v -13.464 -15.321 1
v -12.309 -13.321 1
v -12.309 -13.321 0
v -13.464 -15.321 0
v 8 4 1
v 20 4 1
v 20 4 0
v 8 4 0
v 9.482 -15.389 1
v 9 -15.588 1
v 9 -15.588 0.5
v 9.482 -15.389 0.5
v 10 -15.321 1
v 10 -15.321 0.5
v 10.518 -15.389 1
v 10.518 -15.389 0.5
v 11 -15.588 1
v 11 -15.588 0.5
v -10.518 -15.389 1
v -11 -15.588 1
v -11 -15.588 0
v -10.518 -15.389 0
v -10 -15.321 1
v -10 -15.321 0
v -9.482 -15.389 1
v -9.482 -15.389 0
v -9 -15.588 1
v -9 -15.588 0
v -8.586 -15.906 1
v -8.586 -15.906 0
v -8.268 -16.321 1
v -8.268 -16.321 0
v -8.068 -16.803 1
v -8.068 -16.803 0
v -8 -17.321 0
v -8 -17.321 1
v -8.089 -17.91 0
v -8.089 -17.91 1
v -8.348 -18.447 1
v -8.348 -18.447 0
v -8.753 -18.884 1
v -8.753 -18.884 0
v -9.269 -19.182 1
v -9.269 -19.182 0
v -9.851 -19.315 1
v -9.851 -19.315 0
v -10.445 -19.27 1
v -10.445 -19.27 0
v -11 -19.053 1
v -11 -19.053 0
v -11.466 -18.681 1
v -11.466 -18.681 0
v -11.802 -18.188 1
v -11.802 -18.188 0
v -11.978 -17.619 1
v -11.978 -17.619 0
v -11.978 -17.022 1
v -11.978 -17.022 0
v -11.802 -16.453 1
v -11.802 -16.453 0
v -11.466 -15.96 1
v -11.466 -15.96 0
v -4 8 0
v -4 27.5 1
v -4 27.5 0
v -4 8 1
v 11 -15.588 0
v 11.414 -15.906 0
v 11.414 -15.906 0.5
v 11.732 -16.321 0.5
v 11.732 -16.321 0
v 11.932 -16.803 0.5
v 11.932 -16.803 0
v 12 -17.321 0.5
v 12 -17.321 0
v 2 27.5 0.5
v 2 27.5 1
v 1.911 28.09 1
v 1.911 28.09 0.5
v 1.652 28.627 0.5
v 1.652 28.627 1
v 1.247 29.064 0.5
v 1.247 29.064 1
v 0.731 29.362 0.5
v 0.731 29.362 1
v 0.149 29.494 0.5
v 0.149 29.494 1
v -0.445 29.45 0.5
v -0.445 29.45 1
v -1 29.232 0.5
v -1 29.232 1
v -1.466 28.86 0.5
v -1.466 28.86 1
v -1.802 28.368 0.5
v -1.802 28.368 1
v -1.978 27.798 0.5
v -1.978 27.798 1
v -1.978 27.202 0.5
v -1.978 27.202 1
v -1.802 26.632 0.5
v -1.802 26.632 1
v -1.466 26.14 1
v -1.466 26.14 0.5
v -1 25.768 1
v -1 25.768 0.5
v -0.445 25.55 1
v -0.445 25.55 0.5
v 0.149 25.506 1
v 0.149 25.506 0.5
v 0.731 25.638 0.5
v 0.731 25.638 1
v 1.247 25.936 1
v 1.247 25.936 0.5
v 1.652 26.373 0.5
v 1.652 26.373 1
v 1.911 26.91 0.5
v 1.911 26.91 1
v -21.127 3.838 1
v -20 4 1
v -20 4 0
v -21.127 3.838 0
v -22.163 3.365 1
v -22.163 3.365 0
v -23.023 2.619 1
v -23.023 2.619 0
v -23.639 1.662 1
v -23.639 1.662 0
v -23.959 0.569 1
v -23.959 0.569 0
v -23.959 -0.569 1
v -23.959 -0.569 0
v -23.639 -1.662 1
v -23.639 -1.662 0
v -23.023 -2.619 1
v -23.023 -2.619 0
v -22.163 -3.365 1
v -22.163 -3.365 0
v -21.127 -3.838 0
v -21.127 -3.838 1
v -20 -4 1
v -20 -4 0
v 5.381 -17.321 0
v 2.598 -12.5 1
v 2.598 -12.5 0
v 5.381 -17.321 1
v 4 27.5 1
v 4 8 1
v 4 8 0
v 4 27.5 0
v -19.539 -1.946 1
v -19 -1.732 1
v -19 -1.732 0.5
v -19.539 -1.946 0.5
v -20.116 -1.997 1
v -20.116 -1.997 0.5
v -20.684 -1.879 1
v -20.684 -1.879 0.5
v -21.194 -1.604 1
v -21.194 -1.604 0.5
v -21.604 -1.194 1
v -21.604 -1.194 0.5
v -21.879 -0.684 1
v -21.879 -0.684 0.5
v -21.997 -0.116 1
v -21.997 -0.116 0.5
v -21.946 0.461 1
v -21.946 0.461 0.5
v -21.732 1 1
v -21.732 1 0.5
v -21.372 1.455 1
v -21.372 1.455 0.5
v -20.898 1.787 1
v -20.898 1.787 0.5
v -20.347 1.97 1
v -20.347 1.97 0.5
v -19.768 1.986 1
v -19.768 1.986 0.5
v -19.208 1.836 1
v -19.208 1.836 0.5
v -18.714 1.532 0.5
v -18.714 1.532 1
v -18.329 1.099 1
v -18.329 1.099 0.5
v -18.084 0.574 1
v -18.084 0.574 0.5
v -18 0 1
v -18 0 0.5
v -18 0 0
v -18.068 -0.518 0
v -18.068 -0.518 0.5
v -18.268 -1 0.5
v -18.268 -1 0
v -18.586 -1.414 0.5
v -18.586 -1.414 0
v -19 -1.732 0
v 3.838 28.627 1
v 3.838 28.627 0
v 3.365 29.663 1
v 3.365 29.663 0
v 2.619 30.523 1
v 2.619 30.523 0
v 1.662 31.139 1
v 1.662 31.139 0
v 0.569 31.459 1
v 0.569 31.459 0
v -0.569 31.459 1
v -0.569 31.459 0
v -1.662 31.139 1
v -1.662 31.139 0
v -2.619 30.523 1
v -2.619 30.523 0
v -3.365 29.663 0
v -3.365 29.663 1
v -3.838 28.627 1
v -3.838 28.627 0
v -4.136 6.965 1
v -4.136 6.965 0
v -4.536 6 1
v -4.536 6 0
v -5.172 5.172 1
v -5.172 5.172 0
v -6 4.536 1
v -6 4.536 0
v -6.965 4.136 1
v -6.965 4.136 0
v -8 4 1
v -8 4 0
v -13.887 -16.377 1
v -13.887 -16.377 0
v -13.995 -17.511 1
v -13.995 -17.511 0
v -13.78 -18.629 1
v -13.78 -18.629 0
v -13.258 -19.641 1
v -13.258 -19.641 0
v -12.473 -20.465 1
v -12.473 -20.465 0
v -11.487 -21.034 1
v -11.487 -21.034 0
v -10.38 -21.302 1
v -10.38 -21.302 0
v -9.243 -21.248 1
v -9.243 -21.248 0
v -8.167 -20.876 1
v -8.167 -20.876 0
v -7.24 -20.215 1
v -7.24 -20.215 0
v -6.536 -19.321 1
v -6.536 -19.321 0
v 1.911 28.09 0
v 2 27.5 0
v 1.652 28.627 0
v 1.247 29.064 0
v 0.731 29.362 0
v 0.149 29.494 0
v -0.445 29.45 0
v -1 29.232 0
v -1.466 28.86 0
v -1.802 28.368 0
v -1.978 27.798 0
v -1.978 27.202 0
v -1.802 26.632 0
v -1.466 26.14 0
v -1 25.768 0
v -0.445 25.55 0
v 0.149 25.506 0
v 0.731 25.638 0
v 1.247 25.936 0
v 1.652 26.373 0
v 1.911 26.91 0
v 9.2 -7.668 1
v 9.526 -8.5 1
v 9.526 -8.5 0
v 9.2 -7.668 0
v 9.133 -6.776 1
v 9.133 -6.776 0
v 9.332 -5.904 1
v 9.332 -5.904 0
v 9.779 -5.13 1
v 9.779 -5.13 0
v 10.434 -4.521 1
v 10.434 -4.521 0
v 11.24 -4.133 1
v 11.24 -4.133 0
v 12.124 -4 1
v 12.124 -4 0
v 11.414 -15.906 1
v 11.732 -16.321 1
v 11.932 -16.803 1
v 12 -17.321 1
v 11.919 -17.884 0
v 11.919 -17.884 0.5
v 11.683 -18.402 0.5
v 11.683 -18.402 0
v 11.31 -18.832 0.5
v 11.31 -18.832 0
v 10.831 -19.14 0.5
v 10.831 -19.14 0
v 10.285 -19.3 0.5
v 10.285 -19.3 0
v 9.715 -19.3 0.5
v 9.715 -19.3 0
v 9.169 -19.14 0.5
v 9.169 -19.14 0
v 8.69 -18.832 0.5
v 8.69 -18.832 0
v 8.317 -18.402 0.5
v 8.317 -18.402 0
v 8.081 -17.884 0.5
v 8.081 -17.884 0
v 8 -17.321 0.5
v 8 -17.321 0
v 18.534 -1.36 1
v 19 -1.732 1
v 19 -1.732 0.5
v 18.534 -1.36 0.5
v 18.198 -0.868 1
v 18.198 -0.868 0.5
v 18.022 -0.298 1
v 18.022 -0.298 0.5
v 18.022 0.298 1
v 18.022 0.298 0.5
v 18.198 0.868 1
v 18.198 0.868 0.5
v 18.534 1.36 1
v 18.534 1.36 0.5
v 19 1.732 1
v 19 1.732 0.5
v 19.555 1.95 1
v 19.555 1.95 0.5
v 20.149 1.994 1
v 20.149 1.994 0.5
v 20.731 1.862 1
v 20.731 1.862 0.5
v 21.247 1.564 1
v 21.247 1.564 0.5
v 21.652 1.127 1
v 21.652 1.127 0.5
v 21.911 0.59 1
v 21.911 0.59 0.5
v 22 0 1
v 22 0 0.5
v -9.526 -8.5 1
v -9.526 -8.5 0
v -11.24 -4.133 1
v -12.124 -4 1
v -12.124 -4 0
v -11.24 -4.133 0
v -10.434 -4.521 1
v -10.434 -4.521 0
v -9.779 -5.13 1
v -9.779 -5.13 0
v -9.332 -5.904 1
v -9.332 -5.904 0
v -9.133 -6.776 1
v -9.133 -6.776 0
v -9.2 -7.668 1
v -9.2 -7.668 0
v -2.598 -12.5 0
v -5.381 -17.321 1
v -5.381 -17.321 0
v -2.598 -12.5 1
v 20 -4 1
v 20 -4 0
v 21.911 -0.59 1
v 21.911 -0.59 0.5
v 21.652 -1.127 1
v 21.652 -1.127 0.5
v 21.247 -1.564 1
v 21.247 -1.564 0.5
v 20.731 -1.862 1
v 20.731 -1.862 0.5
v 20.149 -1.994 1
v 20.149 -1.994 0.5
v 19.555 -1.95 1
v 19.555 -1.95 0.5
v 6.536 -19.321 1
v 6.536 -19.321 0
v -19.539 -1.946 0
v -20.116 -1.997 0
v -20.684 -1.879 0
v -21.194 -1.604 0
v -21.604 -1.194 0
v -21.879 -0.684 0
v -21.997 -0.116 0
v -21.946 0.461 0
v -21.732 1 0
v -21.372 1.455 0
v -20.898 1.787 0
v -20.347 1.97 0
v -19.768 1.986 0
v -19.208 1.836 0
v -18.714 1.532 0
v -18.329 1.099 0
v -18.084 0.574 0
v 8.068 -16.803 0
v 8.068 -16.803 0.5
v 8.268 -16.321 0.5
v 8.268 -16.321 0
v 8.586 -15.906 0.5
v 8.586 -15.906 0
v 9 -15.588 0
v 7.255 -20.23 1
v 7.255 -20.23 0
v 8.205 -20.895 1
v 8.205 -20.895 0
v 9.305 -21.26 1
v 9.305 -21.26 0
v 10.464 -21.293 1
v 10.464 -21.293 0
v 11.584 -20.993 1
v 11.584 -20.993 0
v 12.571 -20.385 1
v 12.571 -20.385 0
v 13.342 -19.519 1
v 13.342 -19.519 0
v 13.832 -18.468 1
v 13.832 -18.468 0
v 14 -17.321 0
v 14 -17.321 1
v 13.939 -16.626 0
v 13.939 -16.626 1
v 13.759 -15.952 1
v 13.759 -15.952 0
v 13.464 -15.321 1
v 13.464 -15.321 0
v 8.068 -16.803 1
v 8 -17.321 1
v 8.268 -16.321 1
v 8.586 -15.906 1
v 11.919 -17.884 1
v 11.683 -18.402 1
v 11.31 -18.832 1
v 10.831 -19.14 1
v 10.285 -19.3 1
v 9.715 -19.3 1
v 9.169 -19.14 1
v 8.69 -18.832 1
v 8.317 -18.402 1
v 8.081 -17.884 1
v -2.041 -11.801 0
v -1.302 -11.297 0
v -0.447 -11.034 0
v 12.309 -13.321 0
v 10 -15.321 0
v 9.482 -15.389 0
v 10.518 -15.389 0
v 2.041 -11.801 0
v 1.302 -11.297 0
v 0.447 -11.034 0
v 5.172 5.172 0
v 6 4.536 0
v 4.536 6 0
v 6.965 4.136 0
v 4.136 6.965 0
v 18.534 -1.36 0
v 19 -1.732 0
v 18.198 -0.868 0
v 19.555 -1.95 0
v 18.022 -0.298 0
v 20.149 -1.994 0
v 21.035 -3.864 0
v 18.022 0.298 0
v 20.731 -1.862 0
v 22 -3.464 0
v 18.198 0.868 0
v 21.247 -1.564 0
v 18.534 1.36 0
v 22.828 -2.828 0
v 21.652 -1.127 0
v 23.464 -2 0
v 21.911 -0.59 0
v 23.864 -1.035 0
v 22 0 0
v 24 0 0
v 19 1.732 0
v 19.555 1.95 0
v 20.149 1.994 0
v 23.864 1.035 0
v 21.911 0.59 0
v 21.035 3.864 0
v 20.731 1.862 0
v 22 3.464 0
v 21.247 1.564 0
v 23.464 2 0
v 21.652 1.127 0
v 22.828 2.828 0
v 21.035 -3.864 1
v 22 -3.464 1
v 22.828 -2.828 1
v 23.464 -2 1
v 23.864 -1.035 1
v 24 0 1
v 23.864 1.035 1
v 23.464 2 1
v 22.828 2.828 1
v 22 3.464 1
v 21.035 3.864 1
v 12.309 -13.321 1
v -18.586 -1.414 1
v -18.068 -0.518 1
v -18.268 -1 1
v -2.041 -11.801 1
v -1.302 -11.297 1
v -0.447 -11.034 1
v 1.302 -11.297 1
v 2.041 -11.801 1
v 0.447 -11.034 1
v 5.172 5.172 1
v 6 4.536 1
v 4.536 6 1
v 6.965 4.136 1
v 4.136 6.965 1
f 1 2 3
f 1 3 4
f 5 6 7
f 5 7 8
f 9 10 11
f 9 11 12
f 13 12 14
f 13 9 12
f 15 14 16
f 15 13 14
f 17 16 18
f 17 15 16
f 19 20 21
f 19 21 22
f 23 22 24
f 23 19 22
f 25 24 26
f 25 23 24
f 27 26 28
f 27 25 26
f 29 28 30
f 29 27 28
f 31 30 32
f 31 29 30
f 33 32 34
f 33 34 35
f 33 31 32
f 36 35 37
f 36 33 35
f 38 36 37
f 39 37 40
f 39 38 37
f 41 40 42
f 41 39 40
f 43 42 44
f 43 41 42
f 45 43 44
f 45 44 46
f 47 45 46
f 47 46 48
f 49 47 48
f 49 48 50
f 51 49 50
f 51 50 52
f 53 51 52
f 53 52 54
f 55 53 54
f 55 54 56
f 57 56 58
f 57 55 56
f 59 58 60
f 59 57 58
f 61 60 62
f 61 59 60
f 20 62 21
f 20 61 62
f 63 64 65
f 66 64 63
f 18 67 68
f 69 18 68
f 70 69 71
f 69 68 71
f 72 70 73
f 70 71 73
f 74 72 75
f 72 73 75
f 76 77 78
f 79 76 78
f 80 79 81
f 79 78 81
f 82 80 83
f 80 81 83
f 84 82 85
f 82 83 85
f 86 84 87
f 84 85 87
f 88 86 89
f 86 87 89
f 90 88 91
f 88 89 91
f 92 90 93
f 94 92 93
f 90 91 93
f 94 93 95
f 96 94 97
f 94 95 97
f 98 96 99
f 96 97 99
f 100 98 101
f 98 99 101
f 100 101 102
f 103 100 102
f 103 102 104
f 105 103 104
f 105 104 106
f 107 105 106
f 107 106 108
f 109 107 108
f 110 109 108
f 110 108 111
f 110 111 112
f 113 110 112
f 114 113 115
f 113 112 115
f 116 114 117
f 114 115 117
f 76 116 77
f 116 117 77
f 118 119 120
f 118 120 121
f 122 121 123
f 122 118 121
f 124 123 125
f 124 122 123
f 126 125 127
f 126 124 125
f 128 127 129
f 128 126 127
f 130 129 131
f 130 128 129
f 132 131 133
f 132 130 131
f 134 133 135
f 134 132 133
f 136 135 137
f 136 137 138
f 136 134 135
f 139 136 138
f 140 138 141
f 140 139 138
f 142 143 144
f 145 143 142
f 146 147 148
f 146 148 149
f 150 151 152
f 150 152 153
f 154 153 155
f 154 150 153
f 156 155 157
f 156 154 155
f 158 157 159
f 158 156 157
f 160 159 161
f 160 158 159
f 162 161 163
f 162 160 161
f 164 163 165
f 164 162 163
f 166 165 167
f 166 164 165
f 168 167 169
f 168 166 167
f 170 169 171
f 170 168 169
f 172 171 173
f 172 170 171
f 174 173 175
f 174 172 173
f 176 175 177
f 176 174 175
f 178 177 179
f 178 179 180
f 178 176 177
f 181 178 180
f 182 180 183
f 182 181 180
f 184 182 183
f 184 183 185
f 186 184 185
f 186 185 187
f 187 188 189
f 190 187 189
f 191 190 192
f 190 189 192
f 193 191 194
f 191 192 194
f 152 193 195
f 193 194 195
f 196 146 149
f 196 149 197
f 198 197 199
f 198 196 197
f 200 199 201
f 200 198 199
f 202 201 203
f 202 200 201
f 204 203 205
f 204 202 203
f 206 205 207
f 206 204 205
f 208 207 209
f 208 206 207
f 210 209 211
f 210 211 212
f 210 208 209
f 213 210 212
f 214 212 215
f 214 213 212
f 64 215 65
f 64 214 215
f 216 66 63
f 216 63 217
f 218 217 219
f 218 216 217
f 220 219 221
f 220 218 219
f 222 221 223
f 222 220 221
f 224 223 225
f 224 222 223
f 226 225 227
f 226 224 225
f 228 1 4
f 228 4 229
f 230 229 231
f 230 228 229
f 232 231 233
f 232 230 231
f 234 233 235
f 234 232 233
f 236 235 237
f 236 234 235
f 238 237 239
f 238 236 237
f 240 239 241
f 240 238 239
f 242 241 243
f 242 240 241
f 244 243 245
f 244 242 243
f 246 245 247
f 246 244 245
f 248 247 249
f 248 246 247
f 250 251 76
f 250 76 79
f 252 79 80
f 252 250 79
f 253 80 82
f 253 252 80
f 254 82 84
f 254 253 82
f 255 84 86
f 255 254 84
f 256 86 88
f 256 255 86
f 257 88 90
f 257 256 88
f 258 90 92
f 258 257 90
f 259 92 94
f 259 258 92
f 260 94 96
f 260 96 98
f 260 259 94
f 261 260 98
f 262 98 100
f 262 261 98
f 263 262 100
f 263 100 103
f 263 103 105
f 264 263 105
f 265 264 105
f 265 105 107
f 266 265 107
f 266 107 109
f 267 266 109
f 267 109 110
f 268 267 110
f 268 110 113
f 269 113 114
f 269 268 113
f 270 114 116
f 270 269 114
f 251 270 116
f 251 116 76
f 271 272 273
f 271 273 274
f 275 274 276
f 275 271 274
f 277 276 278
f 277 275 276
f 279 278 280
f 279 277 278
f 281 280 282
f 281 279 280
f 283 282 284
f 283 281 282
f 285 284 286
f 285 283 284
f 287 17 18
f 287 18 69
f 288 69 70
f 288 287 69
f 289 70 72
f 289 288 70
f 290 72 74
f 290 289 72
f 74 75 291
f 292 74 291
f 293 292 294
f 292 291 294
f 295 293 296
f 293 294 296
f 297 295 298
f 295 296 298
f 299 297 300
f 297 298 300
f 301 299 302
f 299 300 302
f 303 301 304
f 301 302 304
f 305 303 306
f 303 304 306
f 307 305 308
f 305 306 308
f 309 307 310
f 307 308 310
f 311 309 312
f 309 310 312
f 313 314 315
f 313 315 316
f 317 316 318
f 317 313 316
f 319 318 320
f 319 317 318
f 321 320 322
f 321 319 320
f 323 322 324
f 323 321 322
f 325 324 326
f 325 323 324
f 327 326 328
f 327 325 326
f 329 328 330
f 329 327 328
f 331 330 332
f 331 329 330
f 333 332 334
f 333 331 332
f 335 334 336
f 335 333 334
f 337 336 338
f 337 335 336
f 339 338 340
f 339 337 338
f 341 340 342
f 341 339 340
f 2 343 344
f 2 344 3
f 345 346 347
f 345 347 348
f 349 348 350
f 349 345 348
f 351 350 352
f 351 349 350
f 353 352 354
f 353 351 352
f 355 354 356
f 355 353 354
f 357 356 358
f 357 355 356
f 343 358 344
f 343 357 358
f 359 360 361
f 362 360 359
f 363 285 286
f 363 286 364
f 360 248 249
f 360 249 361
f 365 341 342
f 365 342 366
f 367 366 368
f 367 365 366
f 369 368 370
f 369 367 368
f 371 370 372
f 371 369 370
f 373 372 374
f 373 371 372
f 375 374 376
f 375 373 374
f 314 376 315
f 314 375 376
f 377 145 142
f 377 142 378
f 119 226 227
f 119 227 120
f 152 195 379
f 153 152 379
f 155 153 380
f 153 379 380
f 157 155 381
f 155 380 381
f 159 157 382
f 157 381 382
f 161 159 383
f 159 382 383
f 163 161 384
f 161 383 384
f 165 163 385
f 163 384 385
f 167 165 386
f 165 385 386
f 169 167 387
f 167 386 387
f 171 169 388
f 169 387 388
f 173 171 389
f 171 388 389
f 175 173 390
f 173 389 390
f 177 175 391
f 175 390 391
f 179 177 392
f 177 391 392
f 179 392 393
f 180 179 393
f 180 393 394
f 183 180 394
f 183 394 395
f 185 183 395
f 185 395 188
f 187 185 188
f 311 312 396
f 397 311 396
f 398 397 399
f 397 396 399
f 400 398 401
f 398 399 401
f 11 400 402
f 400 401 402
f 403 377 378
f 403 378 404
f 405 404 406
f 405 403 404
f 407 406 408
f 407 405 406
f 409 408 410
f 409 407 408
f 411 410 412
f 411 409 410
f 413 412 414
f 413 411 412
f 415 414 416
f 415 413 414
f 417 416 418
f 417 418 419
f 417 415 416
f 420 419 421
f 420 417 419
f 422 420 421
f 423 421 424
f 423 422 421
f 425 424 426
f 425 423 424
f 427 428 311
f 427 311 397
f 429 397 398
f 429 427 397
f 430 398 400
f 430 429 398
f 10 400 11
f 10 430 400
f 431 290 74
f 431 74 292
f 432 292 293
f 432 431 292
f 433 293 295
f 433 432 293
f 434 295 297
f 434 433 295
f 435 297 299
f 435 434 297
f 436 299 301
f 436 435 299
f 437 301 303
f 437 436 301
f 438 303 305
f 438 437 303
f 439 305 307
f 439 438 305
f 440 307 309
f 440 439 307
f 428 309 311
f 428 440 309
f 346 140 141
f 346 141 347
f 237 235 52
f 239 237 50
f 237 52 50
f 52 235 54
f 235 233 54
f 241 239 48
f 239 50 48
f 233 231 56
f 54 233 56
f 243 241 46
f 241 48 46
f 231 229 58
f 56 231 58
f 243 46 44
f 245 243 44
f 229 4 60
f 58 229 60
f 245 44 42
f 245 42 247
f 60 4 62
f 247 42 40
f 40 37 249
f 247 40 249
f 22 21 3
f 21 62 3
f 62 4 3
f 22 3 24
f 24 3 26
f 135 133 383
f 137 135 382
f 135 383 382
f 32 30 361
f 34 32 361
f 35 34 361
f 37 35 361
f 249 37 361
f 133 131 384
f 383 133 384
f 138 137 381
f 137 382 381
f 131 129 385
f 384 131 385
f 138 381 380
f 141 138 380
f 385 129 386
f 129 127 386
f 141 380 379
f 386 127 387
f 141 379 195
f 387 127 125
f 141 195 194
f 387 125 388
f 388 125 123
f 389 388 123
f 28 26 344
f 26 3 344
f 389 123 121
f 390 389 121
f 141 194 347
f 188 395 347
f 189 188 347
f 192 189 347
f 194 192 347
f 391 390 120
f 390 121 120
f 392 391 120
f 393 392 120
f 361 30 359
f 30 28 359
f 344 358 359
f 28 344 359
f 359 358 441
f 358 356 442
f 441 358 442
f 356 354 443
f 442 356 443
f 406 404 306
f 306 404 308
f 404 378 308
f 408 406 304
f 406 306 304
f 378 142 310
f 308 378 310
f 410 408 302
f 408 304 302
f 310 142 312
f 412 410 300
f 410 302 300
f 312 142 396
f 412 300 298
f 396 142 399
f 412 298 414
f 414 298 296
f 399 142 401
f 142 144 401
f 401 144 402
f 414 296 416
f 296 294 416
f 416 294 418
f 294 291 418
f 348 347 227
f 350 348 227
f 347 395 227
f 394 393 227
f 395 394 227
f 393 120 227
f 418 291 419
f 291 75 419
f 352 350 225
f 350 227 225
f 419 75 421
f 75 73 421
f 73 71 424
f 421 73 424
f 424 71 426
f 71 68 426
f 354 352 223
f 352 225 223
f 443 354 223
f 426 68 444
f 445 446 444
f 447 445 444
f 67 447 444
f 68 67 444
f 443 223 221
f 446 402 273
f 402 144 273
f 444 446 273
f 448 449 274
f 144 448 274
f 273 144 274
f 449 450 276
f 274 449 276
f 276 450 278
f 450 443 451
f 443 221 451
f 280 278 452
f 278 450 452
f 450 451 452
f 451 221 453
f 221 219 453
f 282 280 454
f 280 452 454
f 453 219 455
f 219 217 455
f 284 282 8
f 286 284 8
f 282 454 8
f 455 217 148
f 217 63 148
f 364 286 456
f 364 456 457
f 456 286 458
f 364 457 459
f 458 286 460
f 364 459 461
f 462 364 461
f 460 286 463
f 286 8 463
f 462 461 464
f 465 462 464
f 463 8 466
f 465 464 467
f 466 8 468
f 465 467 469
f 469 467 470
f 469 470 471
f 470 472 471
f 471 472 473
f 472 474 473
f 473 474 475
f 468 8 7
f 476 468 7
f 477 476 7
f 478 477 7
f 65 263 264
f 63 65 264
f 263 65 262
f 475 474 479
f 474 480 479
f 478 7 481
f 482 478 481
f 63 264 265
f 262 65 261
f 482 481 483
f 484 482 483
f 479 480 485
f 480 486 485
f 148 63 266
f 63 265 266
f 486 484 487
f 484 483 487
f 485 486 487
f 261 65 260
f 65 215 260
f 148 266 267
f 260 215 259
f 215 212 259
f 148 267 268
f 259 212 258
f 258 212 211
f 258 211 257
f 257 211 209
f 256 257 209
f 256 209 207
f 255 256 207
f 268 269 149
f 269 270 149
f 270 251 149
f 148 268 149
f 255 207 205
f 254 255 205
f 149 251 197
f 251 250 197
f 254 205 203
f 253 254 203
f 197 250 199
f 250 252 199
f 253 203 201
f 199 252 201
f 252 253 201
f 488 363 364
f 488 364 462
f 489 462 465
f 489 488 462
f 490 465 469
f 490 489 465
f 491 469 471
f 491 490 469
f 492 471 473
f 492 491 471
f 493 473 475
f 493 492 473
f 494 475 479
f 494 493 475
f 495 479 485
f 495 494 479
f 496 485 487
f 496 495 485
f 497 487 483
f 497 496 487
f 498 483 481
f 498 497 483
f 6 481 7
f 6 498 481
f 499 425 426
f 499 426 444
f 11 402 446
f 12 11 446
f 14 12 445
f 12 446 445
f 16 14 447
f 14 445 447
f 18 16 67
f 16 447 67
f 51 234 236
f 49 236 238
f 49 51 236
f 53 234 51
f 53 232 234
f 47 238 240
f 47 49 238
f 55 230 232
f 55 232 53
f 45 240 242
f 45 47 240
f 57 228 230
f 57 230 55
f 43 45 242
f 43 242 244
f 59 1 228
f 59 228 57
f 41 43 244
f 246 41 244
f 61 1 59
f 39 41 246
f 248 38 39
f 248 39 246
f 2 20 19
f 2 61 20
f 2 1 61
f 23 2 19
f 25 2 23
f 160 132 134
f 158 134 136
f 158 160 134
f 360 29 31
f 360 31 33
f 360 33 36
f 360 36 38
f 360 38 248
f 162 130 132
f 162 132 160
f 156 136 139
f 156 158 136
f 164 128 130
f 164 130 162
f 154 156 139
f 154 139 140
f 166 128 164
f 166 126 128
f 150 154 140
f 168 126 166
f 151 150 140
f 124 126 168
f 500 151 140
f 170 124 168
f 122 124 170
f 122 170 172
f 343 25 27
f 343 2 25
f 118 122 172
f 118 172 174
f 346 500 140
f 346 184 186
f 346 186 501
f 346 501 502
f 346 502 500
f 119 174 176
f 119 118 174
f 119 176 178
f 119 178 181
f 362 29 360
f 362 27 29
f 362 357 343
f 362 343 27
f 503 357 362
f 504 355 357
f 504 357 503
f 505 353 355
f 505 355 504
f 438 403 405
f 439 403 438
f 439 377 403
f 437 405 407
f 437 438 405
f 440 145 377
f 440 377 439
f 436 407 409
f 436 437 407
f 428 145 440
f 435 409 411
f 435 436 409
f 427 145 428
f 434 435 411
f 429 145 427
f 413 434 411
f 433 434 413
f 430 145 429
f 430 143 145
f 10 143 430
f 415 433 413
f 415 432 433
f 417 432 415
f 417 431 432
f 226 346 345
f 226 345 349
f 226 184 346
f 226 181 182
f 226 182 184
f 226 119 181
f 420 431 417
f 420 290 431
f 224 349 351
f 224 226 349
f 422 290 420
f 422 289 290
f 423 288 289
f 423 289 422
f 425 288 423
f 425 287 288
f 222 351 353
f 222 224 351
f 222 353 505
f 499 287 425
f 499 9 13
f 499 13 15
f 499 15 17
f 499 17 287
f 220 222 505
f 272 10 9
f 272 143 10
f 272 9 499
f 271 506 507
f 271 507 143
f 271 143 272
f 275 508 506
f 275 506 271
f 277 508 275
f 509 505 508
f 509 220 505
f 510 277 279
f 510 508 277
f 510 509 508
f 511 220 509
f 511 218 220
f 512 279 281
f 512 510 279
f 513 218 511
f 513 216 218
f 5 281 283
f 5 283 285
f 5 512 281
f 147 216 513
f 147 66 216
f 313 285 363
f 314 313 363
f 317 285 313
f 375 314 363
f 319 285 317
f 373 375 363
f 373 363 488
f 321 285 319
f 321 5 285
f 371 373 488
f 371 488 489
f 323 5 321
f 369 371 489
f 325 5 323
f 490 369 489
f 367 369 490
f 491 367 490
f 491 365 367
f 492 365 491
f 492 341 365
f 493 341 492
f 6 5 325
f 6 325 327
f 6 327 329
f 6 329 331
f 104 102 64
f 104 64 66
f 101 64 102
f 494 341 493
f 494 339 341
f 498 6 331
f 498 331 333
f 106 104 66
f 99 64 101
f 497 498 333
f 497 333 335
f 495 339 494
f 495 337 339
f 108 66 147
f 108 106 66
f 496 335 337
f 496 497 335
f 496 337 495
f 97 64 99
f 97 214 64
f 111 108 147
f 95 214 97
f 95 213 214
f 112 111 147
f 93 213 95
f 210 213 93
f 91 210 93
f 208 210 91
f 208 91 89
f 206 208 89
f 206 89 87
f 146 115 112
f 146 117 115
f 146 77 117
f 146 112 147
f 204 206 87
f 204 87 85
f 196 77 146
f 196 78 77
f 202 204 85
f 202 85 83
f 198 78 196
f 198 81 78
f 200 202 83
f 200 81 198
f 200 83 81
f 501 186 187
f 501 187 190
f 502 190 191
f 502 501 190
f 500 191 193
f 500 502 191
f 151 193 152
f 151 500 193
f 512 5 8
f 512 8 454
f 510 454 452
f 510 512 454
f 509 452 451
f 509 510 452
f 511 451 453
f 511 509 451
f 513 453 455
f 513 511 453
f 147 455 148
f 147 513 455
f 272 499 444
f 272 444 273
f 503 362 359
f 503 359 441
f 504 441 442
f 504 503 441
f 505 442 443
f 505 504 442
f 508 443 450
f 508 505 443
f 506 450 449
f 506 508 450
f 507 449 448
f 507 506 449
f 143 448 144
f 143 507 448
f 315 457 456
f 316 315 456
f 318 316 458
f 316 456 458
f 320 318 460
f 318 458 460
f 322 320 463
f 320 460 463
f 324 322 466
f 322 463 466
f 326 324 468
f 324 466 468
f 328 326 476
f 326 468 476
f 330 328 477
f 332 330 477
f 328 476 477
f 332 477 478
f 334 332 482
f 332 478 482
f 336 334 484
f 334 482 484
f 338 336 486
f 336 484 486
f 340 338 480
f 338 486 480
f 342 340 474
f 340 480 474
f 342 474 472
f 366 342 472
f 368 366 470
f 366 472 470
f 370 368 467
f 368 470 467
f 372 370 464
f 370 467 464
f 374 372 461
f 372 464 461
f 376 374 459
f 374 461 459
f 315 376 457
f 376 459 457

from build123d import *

# Parameters (mm, degrees)
F0_R     = 2
F1_DEPTH = 0.5


# Not quite as in the source:
# - a pattern or mirror of a feature is missing from the dataset's text; its kind, count and spacing are read off the source's solid


with BuildPart() as f1:
    # F0 (on Top) → F1 (new body)
    with BuildSketch(Plane.XY):
        with BuildLine():
            ThreePointArc((-20, 4), (-17.1715728753, 2.8284271247), (-16, 0))
            Line((-16, 0), (0, 0))
            Line((0, 0), (8, -13.8564064606))
            ThreePointArc((8, -13.8564064606), (10, -13.3205080757), (12, -13.8564064606))
            Line((12, -13.8564064606), (12.3094010768, -13.3205080757))
            Line((12.3094010768, -13.3205080757), (9.5262794416, -8.5))
            ThreePointArc((9.5262794416, -8.5), (9.5262794416, -5.5), (12.124355653, -4))
            Line((12.124355653, -4), (17.6905989232, -4))
            Line((17.6905989232, -4), (18, -3.4641016151))
            ThreePointArc((18, -3.4641016151), (16.1362966948, 1.0352761804), (20, 4))
            Line((20, 4), (8, 4))
            ThreePointArc((8, 4), (5.1715728753, 5.1715728753), (4, 8))
            Line((4, 8), (4, 27.5))
            ThreePointArc((4, 27.5), (0, 23.5), (-4, 27.5))
            Line((-4, 27.5), (-4, 8))
            ThreePointArc((-4, 8), (-5.1715728753, 5.1715728753), (-8, 4))
            Line((-8, 4), (-20, 4))
        make_face()
        with BuildLine():
            Line((0, 0), (-16, 0))
            ThreePointArc((-16, 0), (-16.5358983849, -2), (-18, -3.4641016151))
            Line((-18, -3.4641016151), (-17.6905989232, -4))
            Line((-17.6905989232, -4), (-12.124355653, -4))
            ThreePointArc((-12.124355653, -4), (-9.5262794416, -5.5), (-9.5262794416, -8.5))
            Line((-9.5262794416, -8.5), (-12.3094010768, -13.3205080757))
            Line((-12.3094010768, -13.3205080757), (-12, -13.8564064606))
            ThreePointArc((-12, -13.8564064606), (-10, -13.3205080757), (-8, -13.8564064606))
            Line((-8, -13.8564064606), (0, 0))
        make_face()
        with BuildLine():
            Line((8, -13.8564064606), (0, 0))
            Line((0, 0), (-8, -13.8564064606))
            ThreePointArc((-8, -13.8564064606), (-6.5358983849, -15.3205080757), (-6, -17.3205080757))
            Line((-6, -17.3205080757), (-5.3811978465, -17.3205080757))
            Line((-5.3811978465, -17.3205080757), (-2.5980762114, -12.5))
            ThreePointArc((-2.5980762114, -12.5), (0, -11), (2.5980762114, -12.5))
            Line((2.5980762114, -12.5), (5.3811978465, -17.3205080757))
            Line((5.3811978465, -17.3205080757), (6, -17.3205080757))
            ThreePointArc((6, -17.3205080757), (6.5358983849, -15.3205080757), (8, -13.8564064606))
        make_face()
        with BuildLine():
            Line((-9, -15.5884572681), (-8, -13.8564064606))
            ThreePointArc((-8, -13.8564064606), (-10, -13.3205080757), (-12, -13.8564064606))
            Line((-12, -13.8564064606), (-11, -15.5884572681))
            ThreePointArc((-11, -15.5884572681), (-10, -15.3205080757), (-9, -15.5884572681))
        make_face()
        with BuildLine():
            ThreePointArc((-6.5358983849, -19.3205080757), (-6.1362966948, -18.3557842561), (-6, -17.3205080757))
            Line((-6, -17.3205080757), (-8, -17.3205080757))
            ThreePointArc((-8, -17.3205080757), (-11, -19.0525588833), (-11, -15.5884572681))
            Line((-11, -15.5884572681), (-12, -13.8564064606))
            ThreePointArc((-12, -13.8564064606), (-12.8284271247, -14.4920809509), (-13.4641016151, -15.3205080757))
            ThreePointArc((-13.4641016151, -15.3205080757), (-12, -20.7846096908), (-6.5358983849, -19.3205080757))
        make_face()
        with BuildLine():
            ThreePointArc((-6, -17.3205080757), (-6.5358983849, -15.3205080757), (-8, -13.8564064606))
            Line((-8, -13.8564064606), (-9, -15.5884572681))
            ThreePointArc((-9, -15.5884572681), (-8.2679491924, -16.3205080757), (-8, -17.3205080757))
            Line((-8, -17.3205080757), (-6, -17.3205080757))
        make_face()
        with BuildLine():
            ThreePointArc((13.4641016151, -15.3205080757), (12.8284271247, -14.4920809509), (12, -13.8564064606))
            Line((12, -13.8564064606), (11, -15.5884572681))
            ThreePointArc((11, -15.5884572681), (11.7320508076, -16.3205080757), (12, -17.3205080757))
            ThreePointArc((12, -17.3205080757), (10, -19.3205080757), (8, -17.3205080757))
            Line((8, -17.3205080757), (6, -17.3205080757))
            ThreePointArc((6, -17.3205080757), (6.1362966948, -18.3557842561), (6.5358983849, -19.3205080757))
            ThreePointArc((6.5358983849, -19.3205080757), (11.0352761804, -21.1842113808), (14, -17.3205080757))
            ThreePointArc((14, -17.3205080757), (13.8637033052, -16.2852318953), (13.4641016151, -15.3205080757))
        make_face()
        with BuildLine():
            Line((9, -15.5884572681), (8, -13.8564064606))
            ThreePointArc((8, -13.8564064606), (6.5358983849, -15.3205080757), (6, -17.3205080757))
            Line((6, -17.3205080757), (8, -17.3205080757))
            ThreePointArc((8, -17.3205080757), (8.2679491924, -16.3205080757), (9, -15.5884572681))
        make_face()
        with BuildLine():
            ThreePointArc((12, -13.8564064606), (10, -13.3205080757), (8, -13.8564064606))
            Line((8, -13.8564064606), (9, -15.5884572681))
            ThreePointArc((9, -15.5884572681), (10, -15.3205080757), (11, -15.5884572681))
            Line((11, -15.5884572681), (12, -13.8564064606))
        make_face()
        with BuildLine():
            ThreePointArc((-19, -1.7320508076), (-21.7320508076, 1), (-18, 0))
            Line((-18, 0), (-16, 0))
            ThreePointArc((-16, 0), (-17.1715728753, 2.8284271247), (-20, 4))
            ThreePointArc((-20, 4), (-24, 0), (-20, -4))
            ThreePointArc((-20, -4), (-18.9647238196, -3.8637033052), (-18, -3.4641016151))
            Line((-18, -3.4641016151), (-19, -1.7320508076))
        make_face()
        with BuildLine():
            Line((-16, 0), (-18, 0))
            ThreePointArc((-18, 0), (-18.2679491924, -1), (-19, -1.7320508076))
            Line((-19, -1.7320508076), (-18, -3.4641016151))
            ThreePointArc((-18, -3.4641016151), (-16.5358983849, -2), (-16, 0))
        make_face()
        with BuildLine():
            ThreePointArc((20, 4), (16.1362966948, 1.0352761804), (18, -3.4641016151))
            ThreePointArc((18, -3.4641016151), (18.9647238196, -3.8637033052), (20, -4))
            ThreePointArc((20, -4), (22.8284271247, -2.8284271247), (24, 0))
            ThreePointArc((24, 0), (22.8284271247, 2.8284271247), (20, 4))
        make_face()
        with BuildLine():
            ThreePointArc((22, 0), (21, -1.7320508076), (19, -1.7320508076))
            ThreePointArc((19, -1.7320508076), (19, 1.7320508076), (22, 0))
        make_face(mode=Mode.SUBTRACT)
        with BuildLine():
            ThreePointArc((4, 27.5), (0, 31.5), (-4, 27.5))
            ThreePointArc((-4, 27.5), (0, 23.5), (4, 27.5))
        make_face()
        with Locations((0, 27.5)):
            Circle(F0_R, mode=Mode.SUBTRACT)
        with BuildLine():
            Line((-17.6905989232, -4), (-18, -3.4641016151))
            ThreePointArc((-18, -3.4641016151), (-18.9647238196, -3.8637033052), (-20, -4))
            Line((-20, -4), (-17.6905989232, -4))
        make_face()
        with BuildLine():
            Line((-12, -13.8564064606), (-12.3094010768, -13.3205080757))
            Line((-12.3094010768, -13.3205080757), (-13.4641016151, -15.3205080757))
            ThreePointArc((-13.4641016151, -15.3205080757), (-12.8284271247, -14.4920809509), (-12, -13.8564064606))
        make_face()
        with BuildLine():
            Line((-5.3811978465, -17.3205080757), (-6, -17.3205080757))
            ThreePointArc((-6, -17.3205080757), (-6.1362966948, -18.3557842561), (-6.5358983849, -19.3205080757))
            Line((-6.5358983849, -19.3205080757), (-5.3811978465, -17.3205080757))
        make_face()
        with BuildLine():
            ThreePointArc((6.5358983849, -19.3205080757), (6.1362966948, -18.3557842561), (6, -17.3205080757))
            Line((6, -17.3205080757), (5.3811978465, -17.3205080757))
            Line((5.3811978465, -17.3205080757), (6.5358983849, -19.3205080757))
        make_face()
        with BuildLine():
            Line((12.3094010768, -13.3205080757), (12, -13.8564064606))
            ThreePointArc((12, -13.8564064606), (12.8284271247, -14.4920809509), (13.4641016151, -15.3205080757))
            Line((13.4641016151, -15.3205080757), (12.3094010768, -13.3205080757))
        make_face()
        with BuildLine():
            Line((18, -3.4641016151), (17.6905989232, -4))
            Line((17.6905989232, -4), (20, -4))
            ThreePointArc((20, -4), (18.9647238196, -3.8637033052), (18, -3.4641016151))
        make_face()
    extrude(amount=F1_DEPTH)

    # F1_copies: F1 across plane


with BuildPart() as f1_1:
    add(f1.part)
    add(f1.part.mirror(Plane.XY.offset(0.5)))


solid = f1_1.part
